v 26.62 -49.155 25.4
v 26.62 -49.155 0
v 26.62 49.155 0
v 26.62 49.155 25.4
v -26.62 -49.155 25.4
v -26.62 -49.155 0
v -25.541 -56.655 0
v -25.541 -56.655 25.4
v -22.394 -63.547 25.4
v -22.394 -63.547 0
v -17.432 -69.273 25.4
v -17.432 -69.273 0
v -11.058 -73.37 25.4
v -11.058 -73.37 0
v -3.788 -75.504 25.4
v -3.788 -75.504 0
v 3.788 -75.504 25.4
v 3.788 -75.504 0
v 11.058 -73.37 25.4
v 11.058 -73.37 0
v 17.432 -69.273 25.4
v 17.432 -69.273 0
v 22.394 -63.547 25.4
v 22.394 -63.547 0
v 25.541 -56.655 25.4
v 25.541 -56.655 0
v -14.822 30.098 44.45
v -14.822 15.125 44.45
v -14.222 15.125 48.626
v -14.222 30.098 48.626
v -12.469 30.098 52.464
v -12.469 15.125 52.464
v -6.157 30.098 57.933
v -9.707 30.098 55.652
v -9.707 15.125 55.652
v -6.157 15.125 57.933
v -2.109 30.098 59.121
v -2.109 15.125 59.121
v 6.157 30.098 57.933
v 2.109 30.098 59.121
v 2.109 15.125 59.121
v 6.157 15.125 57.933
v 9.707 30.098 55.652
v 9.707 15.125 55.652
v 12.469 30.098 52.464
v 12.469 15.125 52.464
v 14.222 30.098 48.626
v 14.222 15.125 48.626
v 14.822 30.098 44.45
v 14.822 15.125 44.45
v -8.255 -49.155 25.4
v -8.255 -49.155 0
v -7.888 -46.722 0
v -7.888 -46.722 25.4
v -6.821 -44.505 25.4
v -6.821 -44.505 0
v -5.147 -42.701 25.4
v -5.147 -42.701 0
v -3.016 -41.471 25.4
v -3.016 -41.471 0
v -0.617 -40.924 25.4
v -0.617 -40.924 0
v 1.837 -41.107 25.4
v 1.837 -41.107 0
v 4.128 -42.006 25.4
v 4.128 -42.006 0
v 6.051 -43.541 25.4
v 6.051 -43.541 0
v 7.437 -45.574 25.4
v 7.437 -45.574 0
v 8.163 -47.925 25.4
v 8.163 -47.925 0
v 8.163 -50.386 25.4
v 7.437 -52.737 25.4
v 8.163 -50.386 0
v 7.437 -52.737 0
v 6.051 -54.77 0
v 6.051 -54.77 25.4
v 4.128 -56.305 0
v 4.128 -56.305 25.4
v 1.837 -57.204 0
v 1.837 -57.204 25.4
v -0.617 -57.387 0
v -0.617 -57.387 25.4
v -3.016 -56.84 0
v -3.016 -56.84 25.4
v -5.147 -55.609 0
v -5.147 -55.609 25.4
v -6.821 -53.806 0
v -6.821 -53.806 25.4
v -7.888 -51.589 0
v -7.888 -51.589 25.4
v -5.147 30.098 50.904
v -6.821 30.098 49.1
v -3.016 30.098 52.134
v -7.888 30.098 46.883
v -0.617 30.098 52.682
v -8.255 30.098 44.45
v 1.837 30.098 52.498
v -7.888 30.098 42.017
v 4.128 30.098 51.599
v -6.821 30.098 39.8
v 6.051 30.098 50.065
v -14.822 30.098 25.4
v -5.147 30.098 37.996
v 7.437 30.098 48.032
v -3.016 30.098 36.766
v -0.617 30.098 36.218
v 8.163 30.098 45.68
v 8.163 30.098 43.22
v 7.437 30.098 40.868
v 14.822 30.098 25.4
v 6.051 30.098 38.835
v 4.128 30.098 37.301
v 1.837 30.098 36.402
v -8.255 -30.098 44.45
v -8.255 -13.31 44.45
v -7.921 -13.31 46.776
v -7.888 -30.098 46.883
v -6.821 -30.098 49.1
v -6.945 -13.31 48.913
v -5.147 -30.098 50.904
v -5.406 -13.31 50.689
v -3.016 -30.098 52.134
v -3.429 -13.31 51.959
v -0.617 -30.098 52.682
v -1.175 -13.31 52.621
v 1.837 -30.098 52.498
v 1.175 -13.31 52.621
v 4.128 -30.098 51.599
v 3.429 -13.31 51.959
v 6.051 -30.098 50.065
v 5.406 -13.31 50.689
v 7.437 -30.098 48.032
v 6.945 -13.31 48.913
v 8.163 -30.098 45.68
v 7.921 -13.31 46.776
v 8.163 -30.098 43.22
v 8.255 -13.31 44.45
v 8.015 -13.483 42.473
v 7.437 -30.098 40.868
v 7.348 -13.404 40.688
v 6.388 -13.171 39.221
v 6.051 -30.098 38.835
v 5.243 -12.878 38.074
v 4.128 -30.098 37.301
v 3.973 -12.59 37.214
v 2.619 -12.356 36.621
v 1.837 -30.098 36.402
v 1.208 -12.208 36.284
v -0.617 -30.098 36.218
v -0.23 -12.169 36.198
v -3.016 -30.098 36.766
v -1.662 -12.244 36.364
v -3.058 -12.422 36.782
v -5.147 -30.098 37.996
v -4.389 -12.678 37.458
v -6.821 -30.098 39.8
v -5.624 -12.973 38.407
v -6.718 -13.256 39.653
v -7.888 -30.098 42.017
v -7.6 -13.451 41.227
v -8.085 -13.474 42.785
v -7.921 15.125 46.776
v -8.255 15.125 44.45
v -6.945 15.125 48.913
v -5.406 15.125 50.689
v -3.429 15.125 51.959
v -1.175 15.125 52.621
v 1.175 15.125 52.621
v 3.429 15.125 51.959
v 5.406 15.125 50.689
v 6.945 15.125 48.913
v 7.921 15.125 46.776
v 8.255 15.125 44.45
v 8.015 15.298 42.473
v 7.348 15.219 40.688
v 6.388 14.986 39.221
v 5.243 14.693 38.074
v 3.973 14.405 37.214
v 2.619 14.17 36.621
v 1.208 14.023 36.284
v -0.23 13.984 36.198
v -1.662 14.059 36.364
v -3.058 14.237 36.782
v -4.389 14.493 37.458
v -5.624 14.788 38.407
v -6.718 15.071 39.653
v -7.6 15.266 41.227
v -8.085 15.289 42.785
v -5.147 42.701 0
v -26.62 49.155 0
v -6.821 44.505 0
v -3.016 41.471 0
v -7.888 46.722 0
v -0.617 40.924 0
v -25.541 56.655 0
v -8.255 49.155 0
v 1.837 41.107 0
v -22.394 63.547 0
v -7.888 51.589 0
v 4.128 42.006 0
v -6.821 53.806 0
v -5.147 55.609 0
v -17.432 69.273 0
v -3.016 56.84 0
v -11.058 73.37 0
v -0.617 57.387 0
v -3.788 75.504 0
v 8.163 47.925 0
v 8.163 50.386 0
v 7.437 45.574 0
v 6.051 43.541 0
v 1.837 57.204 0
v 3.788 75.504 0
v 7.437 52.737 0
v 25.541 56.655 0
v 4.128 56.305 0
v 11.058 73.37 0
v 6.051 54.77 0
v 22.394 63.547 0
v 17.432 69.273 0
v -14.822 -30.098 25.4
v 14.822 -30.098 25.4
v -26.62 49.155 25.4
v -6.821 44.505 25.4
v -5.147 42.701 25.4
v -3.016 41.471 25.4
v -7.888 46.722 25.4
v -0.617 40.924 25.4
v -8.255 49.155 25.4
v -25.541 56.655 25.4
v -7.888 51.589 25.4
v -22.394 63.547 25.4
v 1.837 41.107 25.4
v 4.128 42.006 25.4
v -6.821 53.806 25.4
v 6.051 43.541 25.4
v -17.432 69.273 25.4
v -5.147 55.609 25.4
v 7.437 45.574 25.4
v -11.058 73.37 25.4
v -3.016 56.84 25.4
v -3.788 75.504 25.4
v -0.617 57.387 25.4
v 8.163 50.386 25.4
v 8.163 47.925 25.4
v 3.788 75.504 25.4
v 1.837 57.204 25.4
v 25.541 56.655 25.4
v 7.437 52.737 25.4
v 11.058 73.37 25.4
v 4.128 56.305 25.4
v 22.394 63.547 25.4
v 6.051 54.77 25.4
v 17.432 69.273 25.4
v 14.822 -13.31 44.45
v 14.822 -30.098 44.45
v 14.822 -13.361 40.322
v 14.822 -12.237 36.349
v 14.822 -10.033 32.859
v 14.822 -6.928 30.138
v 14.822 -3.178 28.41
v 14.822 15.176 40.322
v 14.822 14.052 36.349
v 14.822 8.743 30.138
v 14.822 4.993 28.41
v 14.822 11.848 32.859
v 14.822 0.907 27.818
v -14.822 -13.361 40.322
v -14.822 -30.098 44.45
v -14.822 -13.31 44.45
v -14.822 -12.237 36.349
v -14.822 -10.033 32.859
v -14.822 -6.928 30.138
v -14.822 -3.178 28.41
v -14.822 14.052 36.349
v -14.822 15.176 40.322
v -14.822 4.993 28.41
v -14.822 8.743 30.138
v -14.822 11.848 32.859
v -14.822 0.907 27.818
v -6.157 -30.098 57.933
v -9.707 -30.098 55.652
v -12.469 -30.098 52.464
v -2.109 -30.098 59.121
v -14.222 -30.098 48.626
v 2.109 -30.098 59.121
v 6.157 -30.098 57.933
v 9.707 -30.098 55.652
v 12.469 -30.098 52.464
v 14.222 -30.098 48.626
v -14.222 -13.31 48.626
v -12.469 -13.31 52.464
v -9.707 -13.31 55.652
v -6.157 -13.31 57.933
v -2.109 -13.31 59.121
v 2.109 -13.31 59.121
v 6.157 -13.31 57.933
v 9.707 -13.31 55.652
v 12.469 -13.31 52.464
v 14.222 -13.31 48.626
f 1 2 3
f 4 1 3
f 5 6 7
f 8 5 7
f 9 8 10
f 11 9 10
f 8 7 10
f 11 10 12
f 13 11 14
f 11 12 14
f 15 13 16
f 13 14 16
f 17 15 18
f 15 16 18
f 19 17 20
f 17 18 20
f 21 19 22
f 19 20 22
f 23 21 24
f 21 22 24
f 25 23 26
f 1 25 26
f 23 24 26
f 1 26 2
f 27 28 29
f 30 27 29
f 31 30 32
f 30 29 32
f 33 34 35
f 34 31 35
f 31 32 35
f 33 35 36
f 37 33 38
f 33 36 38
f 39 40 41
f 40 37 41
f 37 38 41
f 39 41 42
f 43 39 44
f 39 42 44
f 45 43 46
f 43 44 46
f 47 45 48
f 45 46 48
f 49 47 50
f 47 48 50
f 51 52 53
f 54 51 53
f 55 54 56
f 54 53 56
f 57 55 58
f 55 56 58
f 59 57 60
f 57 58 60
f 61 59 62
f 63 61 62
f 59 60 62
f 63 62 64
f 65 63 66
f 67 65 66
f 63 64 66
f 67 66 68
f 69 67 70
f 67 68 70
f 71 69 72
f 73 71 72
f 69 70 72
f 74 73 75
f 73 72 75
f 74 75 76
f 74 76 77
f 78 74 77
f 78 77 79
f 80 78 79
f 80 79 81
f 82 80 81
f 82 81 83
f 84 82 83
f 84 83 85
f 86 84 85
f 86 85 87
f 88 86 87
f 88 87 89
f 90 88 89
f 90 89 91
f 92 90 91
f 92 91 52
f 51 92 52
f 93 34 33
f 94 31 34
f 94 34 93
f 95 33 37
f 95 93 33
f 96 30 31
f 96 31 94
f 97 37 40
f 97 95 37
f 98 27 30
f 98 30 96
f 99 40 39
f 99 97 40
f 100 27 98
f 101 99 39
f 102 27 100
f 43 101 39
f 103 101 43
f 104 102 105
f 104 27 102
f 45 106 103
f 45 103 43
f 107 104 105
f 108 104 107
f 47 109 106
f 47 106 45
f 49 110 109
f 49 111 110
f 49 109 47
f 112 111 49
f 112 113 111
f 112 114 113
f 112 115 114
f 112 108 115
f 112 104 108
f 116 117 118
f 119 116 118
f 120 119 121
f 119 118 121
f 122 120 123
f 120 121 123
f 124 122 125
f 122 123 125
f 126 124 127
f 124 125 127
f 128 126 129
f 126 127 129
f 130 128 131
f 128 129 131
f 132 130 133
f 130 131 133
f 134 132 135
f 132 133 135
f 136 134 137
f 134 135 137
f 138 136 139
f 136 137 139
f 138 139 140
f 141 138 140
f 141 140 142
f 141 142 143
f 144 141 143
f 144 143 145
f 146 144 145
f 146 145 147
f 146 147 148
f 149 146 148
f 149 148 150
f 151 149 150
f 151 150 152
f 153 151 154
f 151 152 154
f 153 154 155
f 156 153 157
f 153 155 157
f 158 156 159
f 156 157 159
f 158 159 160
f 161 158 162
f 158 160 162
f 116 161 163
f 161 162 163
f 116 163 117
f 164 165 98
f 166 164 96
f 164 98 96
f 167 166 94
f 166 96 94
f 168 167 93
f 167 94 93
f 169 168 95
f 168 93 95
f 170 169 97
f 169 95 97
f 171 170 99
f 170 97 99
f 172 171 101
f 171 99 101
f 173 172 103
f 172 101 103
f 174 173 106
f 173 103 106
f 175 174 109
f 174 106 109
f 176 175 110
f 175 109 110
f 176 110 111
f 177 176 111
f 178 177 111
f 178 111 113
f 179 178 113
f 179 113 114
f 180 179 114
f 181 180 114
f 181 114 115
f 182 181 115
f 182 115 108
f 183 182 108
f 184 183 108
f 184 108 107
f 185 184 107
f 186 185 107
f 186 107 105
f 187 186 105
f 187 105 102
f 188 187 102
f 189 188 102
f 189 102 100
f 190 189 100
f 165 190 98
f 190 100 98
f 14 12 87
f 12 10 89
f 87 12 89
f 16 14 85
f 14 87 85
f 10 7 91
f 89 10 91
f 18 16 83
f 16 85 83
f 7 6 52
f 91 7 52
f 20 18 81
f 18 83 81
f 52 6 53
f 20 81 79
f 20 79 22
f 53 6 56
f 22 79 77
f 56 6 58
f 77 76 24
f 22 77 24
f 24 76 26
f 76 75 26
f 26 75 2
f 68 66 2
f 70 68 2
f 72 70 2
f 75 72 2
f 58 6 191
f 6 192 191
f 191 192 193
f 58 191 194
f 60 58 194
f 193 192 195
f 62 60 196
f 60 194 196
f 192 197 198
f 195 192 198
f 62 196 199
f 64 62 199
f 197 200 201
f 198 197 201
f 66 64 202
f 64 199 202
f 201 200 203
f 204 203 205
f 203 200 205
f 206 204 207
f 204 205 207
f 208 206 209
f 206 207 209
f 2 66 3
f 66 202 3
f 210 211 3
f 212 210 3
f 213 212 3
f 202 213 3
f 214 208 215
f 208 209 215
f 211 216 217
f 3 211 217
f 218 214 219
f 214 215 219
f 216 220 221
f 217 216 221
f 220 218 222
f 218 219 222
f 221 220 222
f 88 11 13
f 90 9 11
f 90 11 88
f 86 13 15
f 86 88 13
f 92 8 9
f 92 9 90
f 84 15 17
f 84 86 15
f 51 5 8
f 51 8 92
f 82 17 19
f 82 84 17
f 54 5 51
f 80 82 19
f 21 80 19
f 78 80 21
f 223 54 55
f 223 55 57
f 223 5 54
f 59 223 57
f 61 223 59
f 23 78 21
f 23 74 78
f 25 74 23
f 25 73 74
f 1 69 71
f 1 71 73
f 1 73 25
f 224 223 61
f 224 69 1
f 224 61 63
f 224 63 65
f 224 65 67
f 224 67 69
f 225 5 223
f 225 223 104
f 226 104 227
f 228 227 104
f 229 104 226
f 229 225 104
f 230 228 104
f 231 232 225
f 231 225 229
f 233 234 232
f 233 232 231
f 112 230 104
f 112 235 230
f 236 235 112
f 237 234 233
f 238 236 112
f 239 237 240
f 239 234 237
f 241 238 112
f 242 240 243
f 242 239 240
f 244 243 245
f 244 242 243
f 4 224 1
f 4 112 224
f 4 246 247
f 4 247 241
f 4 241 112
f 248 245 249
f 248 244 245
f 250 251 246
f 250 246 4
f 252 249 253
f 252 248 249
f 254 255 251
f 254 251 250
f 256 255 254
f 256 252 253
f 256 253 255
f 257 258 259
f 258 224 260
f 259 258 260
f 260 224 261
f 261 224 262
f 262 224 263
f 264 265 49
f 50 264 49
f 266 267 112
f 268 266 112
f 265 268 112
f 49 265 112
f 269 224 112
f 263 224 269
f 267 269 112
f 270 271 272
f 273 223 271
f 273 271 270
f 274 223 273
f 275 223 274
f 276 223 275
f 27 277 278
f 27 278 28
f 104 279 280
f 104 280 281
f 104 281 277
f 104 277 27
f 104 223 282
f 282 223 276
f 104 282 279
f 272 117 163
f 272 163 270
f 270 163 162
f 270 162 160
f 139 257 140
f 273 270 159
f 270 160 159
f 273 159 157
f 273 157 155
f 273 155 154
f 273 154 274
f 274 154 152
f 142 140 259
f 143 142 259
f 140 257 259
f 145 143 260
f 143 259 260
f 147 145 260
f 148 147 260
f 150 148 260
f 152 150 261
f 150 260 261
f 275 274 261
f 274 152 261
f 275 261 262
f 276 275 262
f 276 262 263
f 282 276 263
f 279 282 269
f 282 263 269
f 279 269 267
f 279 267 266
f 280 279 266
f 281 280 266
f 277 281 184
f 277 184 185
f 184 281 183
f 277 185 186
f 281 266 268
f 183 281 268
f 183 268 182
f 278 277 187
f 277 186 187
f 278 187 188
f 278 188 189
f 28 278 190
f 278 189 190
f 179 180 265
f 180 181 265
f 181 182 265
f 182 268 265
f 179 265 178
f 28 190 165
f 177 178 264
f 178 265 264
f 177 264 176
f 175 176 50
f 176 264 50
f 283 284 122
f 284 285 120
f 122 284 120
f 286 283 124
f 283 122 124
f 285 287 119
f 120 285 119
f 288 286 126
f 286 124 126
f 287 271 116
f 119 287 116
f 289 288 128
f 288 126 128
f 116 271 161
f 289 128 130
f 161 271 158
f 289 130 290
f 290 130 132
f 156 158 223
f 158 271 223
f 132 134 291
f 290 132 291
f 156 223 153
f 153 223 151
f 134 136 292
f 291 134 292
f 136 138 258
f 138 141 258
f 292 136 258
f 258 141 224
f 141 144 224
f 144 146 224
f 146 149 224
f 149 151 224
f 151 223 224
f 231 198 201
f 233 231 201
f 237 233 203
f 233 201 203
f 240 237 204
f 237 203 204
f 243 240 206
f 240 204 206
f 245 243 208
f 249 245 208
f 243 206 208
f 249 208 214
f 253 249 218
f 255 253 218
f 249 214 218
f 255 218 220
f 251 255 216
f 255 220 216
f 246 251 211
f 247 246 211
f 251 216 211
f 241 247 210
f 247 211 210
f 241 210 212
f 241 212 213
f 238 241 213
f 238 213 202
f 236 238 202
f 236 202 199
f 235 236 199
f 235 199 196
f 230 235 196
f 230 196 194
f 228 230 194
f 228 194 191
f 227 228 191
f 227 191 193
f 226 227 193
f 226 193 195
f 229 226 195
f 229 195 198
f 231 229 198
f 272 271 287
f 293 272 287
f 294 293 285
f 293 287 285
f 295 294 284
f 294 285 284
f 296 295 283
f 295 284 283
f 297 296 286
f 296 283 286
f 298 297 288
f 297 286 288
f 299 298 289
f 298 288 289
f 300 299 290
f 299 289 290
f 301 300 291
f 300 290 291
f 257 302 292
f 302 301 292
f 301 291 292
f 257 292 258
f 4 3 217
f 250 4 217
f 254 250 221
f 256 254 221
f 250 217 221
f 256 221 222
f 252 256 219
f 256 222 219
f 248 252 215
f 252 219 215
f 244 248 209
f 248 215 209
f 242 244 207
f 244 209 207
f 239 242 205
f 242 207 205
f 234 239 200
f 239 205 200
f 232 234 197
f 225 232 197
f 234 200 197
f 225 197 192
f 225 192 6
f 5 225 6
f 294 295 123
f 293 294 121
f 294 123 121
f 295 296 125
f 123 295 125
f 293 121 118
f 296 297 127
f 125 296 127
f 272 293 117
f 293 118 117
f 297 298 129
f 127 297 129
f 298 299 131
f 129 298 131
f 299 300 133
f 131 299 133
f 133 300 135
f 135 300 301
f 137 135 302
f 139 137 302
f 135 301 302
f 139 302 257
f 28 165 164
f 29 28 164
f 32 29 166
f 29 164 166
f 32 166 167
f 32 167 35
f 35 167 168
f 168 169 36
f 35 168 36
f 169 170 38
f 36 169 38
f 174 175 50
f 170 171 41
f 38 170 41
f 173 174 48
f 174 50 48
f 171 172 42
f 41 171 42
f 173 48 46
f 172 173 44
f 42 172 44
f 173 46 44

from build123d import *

# Parameters (mm, degrees)
F1_DEPTH  = 25.4
F3_D      = 16.51
F4_W      = 29.644534
F4_H      = 60.19656
F5_DEPTH  = 38.1
F7_DEPTH  = 67.056
F9_D      = 16.51
F11_DEPTH = 41.44285


with BuildPart() as f1:
    # F0 (on Top) → F1 (new body)
    with BuildSketch(Plane.XY):
        with BuildLine():
            Line((26.619583, -49.155481), (26.619583, 49.155481))
            ThreePointArc((26.619583, 49.155481), (0, 75.775065), (-26.619583, 49.155481))
            Line((-26.619583, 49.155481), (-26.619583, -49.155481))
            ThreePointArc((-26.619583, -49.155481), (0, -75.775065), (26.619583, -49.155481))
        make_face()
    extrude(amount=F1_DEPTH)

    # F3 (through all)
    with Locations(Plane.XY.offset(25.4)):
        with Locations((0, 49.155481), (0, -49.155481)):
            Hole(F3_D / 2)

    # F4 (on face) → F5 (join)
    with BuildSketch(Plane.XY.offset(25.4)):
        Rectangle(F4_W, F4_H)
    extrude(amount=F5_DEPTH)

    # F6 (on face) → F7 (cut)
    with BuildSketch(Plane.XZ.offset(30.09828)):
        with BuildLine():
            Line((14.822267, 44.45), (14.822267, 63.5))
            Line((14.822267, 63.5), (-14.822267, 63.5))
            Line((-14.822267, 63.5), (-14.822267, 44.45))
            ThreePointArc((-14.822267, 44.45), (0, 59.272267), (14.822267, 44.45))
        make_face()
    extrude(amount=-F7_DEPTH, mode=Mode.SUBTRACT)

    # F9 (through all)
    with Locations(Plane.XZ.offset(30.09828)):
        with Locations((0, 44.45)):
            Hole(F9_D / 2)

    # F10 (on face) → F11 (cut, through all)
    with BuildSketch(Plane.YZ.offset(14.822267)):
        with BuildLine():
            Line((-13.309792, 65.187737), (-13.309792, 44.45))
            ThreePointArc((-13.309792, 44.45), (0.907487, 27.818035), (15.124765, 44.45))
            Line((15.124765, 44.45), (15.124765, 65.187737))
            Line((15.124765, 65.187737), (-13.309792, 65.187737))
        make_face()
    extrude(amount=-F11_DEPTH, mode=Mode.SUBTRACT)


solid = f1.part
